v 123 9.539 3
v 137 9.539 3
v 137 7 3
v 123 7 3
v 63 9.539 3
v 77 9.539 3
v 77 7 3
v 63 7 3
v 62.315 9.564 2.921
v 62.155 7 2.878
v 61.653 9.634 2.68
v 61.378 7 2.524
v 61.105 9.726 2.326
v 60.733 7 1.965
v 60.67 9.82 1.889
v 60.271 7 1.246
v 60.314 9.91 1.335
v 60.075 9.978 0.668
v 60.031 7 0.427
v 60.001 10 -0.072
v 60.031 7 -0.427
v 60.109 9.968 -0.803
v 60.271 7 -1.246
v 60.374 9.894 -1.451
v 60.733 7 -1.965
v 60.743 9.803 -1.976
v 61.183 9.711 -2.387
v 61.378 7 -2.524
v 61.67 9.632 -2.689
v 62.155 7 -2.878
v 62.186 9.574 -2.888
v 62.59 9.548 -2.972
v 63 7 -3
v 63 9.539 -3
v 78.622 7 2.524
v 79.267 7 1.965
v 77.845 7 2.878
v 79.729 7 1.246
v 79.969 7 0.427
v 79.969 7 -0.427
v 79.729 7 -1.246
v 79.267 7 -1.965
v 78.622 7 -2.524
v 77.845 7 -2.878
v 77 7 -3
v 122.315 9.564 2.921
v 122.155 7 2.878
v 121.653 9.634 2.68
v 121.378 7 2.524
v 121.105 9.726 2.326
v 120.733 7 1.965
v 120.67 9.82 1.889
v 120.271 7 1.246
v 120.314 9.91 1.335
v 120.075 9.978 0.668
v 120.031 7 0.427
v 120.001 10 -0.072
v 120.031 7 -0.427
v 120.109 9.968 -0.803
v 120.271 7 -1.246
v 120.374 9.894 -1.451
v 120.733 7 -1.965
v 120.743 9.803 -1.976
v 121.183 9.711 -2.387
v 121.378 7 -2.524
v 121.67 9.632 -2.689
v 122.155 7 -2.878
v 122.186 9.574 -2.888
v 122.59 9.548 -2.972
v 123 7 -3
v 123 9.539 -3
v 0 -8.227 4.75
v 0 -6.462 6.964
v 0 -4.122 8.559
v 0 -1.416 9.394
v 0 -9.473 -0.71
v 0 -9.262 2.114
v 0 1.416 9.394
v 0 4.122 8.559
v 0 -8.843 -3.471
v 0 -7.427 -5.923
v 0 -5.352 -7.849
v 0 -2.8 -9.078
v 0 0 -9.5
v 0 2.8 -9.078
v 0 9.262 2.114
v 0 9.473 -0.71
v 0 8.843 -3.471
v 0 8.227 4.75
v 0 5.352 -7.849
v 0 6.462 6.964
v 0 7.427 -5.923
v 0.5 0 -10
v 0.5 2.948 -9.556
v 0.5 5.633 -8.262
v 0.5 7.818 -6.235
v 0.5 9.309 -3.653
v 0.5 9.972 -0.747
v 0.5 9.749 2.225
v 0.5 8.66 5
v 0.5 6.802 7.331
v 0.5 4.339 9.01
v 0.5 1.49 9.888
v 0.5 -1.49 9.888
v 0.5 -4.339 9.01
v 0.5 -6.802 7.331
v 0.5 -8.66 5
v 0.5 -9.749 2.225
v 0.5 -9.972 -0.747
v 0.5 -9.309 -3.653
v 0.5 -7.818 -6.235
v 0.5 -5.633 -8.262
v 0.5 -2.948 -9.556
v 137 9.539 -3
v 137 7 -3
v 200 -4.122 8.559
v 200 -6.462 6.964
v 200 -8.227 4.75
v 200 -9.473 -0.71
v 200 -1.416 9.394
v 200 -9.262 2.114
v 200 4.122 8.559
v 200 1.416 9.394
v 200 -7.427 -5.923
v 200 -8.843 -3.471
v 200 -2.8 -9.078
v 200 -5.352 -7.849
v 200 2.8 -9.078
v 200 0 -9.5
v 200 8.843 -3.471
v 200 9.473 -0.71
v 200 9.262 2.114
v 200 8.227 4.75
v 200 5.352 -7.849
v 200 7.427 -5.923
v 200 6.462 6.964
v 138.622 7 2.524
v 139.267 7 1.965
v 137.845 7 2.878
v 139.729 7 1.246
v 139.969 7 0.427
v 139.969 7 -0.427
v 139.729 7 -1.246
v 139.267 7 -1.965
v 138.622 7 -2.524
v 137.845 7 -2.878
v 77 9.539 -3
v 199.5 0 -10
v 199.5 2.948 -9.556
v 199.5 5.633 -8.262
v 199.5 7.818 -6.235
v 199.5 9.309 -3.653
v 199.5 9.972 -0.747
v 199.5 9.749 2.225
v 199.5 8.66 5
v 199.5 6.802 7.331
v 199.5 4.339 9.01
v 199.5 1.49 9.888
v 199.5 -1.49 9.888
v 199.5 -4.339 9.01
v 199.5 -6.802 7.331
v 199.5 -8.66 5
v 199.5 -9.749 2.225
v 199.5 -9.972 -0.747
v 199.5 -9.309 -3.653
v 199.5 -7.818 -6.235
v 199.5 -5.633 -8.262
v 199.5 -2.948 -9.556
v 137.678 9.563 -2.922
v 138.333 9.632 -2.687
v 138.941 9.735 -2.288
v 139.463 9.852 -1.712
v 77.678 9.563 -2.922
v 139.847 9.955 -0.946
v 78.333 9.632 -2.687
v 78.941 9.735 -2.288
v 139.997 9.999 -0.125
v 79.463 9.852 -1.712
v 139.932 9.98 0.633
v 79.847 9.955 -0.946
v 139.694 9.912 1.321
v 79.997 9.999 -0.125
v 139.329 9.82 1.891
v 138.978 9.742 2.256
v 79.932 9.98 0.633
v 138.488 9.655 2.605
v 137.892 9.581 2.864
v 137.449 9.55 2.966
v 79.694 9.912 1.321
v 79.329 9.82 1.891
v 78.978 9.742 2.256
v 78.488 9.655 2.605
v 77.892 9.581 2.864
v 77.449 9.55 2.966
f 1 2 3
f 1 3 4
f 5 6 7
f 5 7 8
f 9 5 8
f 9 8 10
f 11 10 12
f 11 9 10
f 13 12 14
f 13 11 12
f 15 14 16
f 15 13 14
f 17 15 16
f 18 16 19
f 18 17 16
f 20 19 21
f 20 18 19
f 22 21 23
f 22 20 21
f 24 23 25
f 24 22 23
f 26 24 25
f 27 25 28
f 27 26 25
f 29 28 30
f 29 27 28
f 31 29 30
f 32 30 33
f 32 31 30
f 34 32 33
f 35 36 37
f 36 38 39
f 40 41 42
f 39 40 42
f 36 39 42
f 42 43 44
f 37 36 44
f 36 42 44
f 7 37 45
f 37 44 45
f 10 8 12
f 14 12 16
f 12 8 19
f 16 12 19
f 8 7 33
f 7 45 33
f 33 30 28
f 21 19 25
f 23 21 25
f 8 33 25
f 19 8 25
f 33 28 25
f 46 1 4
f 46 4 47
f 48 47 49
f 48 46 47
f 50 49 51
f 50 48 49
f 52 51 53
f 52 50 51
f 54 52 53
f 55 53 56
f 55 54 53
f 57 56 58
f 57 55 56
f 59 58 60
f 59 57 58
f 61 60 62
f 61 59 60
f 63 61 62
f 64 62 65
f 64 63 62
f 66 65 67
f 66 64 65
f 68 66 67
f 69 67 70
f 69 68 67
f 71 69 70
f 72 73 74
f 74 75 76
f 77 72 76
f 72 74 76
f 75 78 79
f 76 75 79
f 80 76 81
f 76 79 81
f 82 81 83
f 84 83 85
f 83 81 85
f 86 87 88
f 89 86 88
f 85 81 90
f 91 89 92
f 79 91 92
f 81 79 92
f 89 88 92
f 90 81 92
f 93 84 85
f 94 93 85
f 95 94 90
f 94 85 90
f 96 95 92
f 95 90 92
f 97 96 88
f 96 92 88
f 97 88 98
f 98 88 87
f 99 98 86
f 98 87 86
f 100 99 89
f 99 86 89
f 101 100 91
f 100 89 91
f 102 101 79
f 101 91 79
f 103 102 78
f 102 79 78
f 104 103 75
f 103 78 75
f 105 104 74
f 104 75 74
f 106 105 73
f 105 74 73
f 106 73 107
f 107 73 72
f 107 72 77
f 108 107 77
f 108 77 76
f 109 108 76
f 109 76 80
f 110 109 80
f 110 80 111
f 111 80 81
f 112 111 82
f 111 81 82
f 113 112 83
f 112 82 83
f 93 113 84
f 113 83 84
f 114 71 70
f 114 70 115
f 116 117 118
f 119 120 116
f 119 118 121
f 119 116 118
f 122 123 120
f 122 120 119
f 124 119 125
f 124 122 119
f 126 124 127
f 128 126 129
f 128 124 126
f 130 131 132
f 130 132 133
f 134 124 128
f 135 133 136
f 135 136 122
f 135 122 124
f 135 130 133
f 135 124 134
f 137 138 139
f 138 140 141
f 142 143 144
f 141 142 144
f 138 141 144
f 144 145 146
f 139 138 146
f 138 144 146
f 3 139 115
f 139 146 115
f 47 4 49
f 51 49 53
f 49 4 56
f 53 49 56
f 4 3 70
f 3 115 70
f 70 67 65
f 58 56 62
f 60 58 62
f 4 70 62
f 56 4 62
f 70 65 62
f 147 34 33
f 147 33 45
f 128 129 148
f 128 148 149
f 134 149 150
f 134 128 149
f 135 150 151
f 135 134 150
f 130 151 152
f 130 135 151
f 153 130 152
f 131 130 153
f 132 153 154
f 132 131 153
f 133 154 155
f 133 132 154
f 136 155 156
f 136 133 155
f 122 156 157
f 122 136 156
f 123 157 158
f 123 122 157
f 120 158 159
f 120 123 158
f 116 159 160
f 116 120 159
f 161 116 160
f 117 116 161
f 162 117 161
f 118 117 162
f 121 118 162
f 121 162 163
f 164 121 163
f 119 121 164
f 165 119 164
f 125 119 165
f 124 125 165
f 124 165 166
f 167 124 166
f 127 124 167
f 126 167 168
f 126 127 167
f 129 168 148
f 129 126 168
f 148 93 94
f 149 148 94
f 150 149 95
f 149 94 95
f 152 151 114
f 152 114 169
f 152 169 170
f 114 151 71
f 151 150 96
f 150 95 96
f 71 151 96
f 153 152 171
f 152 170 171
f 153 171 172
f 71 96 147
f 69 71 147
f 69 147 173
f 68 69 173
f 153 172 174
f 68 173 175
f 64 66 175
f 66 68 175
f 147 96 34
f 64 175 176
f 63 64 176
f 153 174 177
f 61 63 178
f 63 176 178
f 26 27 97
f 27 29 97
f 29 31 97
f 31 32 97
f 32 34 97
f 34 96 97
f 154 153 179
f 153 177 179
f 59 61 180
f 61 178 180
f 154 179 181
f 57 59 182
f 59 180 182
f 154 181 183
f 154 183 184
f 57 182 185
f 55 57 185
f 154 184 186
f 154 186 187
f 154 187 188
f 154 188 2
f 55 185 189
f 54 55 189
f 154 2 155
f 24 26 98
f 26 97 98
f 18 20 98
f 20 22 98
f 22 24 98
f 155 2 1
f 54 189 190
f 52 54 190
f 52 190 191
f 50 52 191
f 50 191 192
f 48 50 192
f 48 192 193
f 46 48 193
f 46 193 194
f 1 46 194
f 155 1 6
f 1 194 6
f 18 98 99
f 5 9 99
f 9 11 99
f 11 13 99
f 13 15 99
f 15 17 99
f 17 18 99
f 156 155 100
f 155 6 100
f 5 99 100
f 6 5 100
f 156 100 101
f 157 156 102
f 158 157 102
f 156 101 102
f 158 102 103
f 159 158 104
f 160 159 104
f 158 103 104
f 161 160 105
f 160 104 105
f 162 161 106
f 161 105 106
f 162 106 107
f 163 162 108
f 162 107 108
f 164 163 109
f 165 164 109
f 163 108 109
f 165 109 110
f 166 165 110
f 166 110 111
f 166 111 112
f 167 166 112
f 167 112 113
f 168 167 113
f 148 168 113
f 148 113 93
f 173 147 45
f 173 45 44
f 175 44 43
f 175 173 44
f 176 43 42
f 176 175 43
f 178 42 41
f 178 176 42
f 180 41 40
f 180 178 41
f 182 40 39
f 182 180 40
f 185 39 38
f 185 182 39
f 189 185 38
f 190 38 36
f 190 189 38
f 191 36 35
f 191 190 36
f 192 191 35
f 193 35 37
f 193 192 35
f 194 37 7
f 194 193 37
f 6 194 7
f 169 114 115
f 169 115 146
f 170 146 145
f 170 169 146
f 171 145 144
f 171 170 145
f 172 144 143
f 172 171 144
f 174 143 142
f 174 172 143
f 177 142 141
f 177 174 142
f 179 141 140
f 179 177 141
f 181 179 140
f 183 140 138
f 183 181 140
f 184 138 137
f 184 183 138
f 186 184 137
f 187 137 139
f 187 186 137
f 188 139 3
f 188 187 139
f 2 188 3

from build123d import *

# Parameters (mm, degrees)
SKETCH_1_R          = 10
EXTRUDE_1_DEPTH     = 100
CUT_EXTRUDE_1_DEPTH = 3
CHAMFER_1_SIZE      = 0.5
SKETCH_3_R          = 10
EXTRUDE_2_DEPTH     = 100
CUT_EXTRUDE_2_DEPTH = 3
CHAMFER_2_SIZE      = 0.5


with BuildPart() as part:
    # 草图1 → 凸台-拉伸1 (new body)
    with BuildSketch(Plane(origin=(0, 0, 0), x_dir=(0, 0, -1), z_dir=(1, 0, 0))):
        Circle(SKETCH_1_R)
    extrude(amount=EXTRUDE_1_DEPTH)

    # 草图2 → 切除-拉伸1 (cut)
    with BuildSketch(Plane(origin=(0, 10, 0), x_dir=(1, 0, 0), z_dir=(0, 1, 0))):
        with BuildLine():
            Line((63, 3), (77, 3))
            ThreePointArc((77, 3), (80, 0), (77, -3))
            Line((77, -3), (63, -3))
            ThreePointArc((63, -3), (60, 0), (63, 3))
        make_face()
    extrude(amount=-CUT_EXTRUDE_1_DEPTH, mode=Mode.SUBTRACT)

    # 倒角1
    chamfer_1_edges = [part.edges().sort_by_distance(p)[0] for p in [
        (0, 0, 10),
    ]]
    chamfer(chamfer_1_edges, length=CHAMFER_1_SIZE)

    # 草图3 → 凸台-拉伸2 (add)
    with BuildSketch(Plane(origin=(100, 0, 0), x_dir=(0, 0, -1), z_dir=(1, 0, 0))):
        Circle(SKETCH_3_R)
    extrude(amount=EXTRUDE_2_DEPTH)

    # 草图4 → 切除-拉伸2 (cut)
    with BuildSketch(Plane(origin=(0, 10, 0), x_dir=(1, 0, 0), z_dir=(0, 1, 0))):
        with BuildLine():
            Line((123, 3), (137, 3))
            ThreePointArc((137, 3), (140, 0), (137, -3))
            Line((137, -3), (123, -3))
            ThreePointArc((123, -3), (120, 0), (123, 3))
        make_face()
    extrude(amount=-CUT_EXTRUDE_2_DEPTH, mode=Mode.SUBTRACT)

    # 倒角2
    chamfer_2_edges = [part.edges().sort_by_distance(p)[0] for p in [
        (200, 0, 10),
    ]]
    chamfer(chamfer_2_edges, length=CHAMFER_2_SIZE)


solid = part.part
